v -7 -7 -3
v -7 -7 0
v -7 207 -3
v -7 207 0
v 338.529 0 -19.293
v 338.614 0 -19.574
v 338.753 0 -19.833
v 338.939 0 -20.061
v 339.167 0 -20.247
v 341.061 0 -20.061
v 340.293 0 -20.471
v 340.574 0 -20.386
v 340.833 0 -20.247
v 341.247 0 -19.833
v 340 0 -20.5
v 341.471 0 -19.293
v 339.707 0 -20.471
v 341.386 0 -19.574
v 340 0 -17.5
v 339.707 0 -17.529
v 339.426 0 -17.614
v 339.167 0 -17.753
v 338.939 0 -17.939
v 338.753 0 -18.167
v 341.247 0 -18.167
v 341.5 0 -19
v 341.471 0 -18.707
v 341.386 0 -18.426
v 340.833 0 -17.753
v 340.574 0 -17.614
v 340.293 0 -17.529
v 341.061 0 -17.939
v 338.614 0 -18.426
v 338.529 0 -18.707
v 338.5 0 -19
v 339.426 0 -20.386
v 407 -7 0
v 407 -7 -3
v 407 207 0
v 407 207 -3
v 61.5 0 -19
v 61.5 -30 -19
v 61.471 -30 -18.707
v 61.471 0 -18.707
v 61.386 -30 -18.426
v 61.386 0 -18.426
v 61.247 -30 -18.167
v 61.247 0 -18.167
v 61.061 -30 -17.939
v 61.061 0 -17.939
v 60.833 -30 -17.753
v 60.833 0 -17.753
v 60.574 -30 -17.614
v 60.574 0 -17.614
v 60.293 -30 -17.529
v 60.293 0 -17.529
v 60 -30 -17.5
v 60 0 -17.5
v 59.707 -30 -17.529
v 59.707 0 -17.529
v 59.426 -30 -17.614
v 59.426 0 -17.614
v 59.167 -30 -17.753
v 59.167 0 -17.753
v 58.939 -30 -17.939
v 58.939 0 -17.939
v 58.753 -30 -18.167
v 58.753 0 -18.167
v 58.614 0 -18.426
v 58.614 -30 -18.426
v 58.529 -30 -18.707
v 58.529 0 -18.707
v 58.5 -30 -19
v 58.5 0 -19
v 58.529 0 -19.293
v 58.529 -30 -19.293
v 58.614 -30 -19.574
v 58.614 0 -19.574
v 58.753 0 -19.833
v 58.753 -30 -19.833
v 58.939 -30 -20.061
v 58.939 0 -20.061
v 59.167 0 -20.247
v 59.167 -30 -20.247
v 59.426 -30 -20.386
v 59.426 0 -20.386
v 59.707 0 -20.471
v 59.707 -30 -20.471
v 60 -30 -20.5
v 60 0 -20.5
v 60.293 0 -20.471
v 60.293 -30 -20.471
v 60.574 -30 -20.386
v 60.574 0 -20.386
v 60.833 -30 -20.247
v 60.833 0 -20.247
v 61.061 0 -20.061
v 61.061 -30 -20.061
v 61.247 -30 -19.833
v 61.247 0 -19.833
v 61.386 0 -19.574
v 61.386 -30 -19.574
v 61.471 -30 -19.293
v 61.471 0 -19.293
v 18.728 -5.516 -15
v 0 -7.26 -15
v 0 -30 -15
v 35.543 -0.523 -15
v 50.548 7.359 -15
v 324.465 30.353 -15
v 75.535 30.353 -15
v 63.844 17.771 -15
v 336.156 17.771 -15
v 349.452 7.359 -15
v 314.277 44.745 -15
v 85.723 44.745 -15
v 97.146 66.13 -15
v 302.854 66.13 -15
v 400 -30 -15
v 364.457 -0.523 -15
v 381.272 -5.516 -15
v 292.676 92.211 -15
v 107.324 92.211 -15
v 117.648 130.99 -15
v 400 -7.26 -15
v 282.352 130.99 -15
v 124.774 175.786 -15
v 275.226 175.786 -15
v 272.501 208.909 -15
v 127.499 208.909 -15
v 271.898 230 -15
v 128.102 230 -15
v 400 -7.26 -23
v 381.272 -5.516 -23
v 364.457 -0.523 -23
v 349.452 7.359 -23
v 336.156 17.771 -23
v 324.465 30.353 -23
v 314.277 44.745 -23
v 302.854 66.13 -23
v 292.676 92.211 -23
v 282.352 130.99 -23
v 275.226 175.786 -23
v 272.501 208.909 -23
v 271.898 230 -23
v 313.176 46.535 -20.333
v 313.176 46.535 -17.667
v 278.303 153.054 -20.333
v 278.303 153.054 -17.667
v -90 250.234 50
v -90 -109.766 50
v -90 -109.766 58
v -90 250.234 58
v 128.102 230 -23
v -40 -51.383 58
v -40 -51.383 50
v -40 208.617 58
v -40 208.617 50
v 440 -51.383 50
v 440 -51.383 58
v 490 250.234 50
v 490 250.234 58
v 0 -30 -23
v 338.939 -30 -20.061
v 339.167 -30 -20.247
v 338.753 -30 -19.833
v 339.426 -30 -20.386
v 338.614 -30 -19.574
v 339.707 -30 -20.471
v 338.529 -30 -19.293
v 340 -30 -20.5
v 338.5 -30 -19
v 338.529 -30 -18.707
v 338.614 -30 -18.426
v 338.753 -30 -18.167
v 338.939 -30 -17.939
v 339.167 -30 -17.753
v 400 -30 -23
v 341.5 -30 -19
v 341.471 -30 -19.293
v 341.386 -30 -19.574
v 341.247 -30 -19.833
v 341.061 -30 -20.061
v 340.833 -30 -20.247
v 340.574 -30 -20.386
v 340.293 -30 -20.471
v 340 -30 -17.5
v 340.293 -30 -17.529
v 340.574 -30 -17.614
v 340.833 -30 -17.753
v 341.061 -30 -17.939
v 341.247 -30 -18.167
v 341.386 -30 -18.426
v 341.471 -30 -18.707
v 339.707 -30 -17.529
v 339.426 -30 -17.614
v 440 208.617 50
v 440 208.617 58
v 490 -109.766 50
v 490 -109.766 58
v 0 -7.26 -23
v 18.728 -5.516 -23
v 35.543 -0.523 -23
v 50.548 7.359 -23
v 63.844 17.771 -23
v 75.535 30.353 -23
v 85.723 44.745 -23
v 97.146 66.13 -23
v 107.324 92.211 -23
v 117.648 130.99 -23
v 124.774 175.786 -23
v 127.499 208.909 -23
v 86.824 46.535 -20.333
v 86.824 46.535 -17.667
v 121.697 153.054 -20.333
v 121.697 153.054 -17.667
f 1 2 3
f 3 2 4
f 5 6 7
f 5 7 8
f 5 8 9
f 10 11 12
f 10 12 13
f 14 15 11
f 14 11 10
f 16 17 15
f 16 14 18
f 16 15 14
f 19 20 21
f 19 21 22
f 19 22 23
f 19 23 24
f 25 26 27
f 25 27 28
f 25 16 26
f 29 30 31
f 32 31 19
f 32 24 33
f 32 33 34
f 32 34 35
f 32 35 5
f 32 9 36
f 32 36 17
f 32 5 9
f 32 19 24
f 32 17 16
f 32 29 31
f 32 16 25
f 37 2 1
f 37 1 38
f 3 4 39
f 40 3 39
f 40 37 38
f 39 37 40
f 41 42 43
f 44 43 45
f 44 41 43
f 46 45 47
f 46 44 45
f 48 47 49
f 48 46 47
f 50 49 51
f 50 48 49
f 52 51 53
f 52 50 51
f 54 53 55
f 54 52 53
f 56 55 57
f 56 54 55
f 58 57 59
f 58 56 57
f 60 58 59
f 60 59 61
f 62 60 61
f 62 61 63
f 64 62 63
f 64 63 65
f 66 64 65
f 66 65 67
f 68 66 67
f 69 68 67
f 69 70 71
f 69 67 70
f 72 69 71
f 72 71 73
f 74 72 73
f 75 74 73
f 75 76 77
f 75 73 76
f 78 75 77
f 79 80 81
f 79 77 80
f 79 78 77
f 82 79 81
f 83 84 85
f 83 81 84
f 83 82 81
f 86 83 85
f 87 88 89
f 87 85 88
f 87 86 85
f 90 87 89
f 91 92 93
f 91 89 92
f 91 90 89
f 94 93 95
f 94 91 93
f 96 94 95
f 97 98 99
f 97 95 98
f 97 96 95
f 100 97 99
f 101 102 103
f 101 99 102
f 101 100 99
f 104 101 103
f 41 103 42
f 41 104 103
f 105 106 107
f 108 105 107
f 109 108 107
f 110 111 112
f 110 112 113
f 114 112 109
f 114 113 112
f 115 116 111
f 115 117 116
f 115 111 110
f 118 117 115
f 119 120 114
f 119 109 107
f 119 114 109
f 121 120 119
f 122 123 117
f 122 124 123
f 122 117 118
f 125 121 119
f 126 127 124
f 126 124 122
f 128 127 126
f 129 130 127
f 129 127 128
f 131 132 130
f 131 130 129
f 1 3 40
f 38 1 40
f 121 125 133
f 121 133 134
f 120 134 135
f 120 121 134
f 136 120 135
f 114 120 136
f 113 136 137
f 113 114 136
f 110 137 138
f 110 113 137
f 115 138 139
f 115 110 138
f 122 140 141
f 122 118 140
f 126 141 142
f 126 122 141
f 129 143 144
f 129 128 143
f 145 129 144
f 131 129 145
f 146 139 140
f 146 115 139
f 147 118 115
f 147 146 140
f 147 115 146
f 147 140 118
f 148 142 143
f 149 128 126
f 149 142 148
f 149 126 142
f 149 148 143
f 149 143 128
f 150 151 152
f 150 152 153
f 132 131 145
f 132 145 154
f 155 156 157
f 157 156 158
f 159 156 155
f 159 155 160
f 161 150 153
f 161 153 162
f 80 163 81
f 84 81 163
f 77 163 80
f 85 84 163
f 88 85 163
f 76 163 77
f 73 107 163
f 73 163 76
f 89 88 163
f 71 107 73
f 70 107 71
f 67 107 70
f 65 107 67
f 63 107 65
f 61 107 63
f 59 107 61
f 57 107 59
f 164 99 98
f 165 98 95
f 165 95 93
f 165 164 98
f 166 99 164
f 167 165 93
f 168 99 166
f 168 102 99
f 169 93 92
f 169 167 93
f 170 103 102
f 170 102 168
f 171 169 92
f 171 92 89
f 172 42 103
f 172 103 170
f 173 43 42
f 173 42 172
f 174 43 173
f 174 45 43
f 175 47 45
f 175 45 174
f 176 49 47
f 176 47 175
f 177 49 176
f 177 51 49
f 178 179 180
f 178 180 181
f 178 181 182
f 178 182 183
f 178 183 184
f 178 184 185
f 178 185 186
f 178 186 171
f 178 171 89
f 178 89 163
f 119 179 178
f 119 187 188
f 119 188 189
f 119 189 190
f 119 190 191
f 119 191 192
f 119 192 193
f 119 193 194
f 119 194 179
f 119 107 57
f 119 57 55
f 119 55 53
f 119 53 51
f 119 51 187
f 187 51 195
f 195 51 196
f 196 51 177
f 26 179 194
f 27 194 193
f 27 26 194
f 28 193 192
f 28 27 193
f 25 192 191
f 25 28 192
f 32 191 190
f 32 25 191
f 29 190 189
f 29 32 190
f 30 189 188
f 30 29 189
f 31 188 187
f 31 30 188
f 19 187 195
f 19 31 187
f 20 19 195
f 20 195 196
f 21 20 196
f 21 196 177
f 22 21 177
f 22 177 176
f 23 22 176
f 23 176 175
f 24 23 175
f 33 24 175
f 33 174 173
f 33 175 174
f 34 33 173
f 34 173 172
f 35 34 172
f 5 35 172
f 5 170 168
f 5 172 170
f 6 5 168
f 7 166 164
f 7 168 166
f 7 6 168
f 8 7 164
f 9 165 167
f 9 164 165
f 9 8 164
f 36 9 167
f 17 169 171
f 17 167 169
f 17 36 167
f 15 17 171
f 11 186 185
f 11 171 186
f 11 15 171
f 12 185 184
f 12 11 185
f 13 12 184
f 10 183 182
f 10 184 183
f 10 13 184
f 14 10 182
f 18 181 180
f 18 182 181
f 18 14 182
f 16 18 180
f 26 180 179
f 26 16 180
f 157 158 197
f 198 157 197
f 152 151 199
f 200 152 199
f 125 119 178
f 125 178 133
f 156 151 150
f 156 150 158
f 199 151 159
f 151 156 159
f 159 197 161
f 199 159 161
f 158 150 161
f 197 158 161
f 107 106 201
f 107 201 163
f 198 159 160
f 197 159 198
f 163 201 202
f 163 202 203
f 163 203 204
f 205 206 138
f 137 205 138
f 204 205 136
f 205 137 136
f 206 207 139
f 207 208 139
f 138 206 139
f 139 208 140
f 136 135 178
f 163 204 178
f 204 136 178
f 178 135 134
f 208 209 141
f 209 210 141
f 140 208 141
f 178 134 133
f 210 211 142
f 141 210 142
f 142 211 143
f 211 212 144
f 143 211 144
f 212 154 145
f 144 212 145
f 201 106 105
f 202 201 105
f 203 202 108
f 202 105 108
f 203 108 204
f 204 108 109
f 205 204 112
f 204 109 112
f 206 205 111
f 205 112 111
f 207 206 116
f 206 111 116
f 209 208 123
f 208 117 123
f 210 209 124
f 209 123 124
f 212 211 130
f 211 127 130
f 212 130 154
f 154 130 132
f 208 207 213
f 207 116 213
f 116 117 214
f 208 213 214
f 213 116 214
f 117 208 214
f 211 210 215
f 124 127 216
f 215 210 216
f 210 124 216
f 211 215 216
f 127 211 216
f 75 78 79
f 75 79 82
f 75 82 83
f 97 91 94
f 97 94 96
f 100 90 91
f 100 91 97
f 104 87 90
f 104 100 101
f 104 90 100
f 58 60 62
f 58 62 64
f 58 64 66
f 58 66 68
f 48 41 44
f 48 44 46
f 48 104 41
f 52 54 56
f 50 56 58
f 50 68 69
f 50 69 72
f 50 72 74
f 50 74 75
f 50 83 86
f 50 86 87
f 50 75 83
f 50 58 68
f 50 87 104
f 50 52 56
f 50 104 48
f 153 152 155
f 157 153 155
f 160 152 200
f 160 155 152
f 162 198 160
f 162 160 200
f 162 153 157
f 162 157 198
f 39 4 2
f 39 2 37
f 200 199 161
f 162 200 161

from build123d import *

# Parameters (mm, degrees)
F0_W     = 414
F0_H     = 214
F1_DEPTH = 3
F4_DEPTH = 8
F5_R     = 1.5
F6_DEPTH = 30.001
F8_W     = 580
F8_H     = 360
F8_W_2   = 480
F8_H_2   = 260
F9_DEPTH = 8


with BuildPart() as f1:
    # F0 (on Top) → F1 (new body)
    with BuildSketch(Plane.XY):
        with Locations((200, 100)):
            Rectangle(F0_W, F0_H)
    extrude(amount=-F1_DEPTH)


with BuildPart() as f4:
    # F3 (on offset) → F4 (new body)
    with BuildSketch(Plane.XY.offset(-15)):
        with BuildLine():
            Line((0, -7.259924), (0, -30))
            Line((0, -30), (400, -30))
            Line((400, -30), (400, -7.259924))
            add(Edge.make_bspline(
                [(400, -7.259924), (279.372686, -7.259924), (271.897802, 195.273831), (271.897802, 230)],
                knots=[0, 0, 0, 0, 269.633909, 269.633909, 269.633909, 269.633909], degree=3))
            Line((271.897802, 230), (128.102198, 230))
            add(Edge.make_bspline(
                [(0, -7.259924), (120.627314, -7.259924), (128.102198, 195.273831), (128.102198, 230)],
                knots=[0, 0, 0, 0, 269.633909, 269.633909, 269.633909, 269.633909], degree=3))
        make_face()
    extrude(amount=-F4_DEPTH)

    # F5 (on Front) → F6 (cut, through all)
    with BuildSketch(Plane.XZ):
        with Locations((340, -19)):
            Circle(F5_R)
        with Locations((60, -19)):
            Circle(F5_R)
    extrude(amount=F6_DEPTH, mode=Mode.SUBTRACT)


with BuildPart() as f9:
    # F8 (on offset) → F9 (new body)
    with BuildSketch(Plane.XY.offset(50)):
        with Locations((200, 70.234142)):
            Rectangle(F8_W, F8_H)
        with Locations((200, 78.616977)):
            Rectangle(F8_W_2, F8_H_2, mode=Mode.SUBTRACT)
    extrude(amount=F9_DEPTH)


solid = Compound([f1.part, f4.part, f9.part])
